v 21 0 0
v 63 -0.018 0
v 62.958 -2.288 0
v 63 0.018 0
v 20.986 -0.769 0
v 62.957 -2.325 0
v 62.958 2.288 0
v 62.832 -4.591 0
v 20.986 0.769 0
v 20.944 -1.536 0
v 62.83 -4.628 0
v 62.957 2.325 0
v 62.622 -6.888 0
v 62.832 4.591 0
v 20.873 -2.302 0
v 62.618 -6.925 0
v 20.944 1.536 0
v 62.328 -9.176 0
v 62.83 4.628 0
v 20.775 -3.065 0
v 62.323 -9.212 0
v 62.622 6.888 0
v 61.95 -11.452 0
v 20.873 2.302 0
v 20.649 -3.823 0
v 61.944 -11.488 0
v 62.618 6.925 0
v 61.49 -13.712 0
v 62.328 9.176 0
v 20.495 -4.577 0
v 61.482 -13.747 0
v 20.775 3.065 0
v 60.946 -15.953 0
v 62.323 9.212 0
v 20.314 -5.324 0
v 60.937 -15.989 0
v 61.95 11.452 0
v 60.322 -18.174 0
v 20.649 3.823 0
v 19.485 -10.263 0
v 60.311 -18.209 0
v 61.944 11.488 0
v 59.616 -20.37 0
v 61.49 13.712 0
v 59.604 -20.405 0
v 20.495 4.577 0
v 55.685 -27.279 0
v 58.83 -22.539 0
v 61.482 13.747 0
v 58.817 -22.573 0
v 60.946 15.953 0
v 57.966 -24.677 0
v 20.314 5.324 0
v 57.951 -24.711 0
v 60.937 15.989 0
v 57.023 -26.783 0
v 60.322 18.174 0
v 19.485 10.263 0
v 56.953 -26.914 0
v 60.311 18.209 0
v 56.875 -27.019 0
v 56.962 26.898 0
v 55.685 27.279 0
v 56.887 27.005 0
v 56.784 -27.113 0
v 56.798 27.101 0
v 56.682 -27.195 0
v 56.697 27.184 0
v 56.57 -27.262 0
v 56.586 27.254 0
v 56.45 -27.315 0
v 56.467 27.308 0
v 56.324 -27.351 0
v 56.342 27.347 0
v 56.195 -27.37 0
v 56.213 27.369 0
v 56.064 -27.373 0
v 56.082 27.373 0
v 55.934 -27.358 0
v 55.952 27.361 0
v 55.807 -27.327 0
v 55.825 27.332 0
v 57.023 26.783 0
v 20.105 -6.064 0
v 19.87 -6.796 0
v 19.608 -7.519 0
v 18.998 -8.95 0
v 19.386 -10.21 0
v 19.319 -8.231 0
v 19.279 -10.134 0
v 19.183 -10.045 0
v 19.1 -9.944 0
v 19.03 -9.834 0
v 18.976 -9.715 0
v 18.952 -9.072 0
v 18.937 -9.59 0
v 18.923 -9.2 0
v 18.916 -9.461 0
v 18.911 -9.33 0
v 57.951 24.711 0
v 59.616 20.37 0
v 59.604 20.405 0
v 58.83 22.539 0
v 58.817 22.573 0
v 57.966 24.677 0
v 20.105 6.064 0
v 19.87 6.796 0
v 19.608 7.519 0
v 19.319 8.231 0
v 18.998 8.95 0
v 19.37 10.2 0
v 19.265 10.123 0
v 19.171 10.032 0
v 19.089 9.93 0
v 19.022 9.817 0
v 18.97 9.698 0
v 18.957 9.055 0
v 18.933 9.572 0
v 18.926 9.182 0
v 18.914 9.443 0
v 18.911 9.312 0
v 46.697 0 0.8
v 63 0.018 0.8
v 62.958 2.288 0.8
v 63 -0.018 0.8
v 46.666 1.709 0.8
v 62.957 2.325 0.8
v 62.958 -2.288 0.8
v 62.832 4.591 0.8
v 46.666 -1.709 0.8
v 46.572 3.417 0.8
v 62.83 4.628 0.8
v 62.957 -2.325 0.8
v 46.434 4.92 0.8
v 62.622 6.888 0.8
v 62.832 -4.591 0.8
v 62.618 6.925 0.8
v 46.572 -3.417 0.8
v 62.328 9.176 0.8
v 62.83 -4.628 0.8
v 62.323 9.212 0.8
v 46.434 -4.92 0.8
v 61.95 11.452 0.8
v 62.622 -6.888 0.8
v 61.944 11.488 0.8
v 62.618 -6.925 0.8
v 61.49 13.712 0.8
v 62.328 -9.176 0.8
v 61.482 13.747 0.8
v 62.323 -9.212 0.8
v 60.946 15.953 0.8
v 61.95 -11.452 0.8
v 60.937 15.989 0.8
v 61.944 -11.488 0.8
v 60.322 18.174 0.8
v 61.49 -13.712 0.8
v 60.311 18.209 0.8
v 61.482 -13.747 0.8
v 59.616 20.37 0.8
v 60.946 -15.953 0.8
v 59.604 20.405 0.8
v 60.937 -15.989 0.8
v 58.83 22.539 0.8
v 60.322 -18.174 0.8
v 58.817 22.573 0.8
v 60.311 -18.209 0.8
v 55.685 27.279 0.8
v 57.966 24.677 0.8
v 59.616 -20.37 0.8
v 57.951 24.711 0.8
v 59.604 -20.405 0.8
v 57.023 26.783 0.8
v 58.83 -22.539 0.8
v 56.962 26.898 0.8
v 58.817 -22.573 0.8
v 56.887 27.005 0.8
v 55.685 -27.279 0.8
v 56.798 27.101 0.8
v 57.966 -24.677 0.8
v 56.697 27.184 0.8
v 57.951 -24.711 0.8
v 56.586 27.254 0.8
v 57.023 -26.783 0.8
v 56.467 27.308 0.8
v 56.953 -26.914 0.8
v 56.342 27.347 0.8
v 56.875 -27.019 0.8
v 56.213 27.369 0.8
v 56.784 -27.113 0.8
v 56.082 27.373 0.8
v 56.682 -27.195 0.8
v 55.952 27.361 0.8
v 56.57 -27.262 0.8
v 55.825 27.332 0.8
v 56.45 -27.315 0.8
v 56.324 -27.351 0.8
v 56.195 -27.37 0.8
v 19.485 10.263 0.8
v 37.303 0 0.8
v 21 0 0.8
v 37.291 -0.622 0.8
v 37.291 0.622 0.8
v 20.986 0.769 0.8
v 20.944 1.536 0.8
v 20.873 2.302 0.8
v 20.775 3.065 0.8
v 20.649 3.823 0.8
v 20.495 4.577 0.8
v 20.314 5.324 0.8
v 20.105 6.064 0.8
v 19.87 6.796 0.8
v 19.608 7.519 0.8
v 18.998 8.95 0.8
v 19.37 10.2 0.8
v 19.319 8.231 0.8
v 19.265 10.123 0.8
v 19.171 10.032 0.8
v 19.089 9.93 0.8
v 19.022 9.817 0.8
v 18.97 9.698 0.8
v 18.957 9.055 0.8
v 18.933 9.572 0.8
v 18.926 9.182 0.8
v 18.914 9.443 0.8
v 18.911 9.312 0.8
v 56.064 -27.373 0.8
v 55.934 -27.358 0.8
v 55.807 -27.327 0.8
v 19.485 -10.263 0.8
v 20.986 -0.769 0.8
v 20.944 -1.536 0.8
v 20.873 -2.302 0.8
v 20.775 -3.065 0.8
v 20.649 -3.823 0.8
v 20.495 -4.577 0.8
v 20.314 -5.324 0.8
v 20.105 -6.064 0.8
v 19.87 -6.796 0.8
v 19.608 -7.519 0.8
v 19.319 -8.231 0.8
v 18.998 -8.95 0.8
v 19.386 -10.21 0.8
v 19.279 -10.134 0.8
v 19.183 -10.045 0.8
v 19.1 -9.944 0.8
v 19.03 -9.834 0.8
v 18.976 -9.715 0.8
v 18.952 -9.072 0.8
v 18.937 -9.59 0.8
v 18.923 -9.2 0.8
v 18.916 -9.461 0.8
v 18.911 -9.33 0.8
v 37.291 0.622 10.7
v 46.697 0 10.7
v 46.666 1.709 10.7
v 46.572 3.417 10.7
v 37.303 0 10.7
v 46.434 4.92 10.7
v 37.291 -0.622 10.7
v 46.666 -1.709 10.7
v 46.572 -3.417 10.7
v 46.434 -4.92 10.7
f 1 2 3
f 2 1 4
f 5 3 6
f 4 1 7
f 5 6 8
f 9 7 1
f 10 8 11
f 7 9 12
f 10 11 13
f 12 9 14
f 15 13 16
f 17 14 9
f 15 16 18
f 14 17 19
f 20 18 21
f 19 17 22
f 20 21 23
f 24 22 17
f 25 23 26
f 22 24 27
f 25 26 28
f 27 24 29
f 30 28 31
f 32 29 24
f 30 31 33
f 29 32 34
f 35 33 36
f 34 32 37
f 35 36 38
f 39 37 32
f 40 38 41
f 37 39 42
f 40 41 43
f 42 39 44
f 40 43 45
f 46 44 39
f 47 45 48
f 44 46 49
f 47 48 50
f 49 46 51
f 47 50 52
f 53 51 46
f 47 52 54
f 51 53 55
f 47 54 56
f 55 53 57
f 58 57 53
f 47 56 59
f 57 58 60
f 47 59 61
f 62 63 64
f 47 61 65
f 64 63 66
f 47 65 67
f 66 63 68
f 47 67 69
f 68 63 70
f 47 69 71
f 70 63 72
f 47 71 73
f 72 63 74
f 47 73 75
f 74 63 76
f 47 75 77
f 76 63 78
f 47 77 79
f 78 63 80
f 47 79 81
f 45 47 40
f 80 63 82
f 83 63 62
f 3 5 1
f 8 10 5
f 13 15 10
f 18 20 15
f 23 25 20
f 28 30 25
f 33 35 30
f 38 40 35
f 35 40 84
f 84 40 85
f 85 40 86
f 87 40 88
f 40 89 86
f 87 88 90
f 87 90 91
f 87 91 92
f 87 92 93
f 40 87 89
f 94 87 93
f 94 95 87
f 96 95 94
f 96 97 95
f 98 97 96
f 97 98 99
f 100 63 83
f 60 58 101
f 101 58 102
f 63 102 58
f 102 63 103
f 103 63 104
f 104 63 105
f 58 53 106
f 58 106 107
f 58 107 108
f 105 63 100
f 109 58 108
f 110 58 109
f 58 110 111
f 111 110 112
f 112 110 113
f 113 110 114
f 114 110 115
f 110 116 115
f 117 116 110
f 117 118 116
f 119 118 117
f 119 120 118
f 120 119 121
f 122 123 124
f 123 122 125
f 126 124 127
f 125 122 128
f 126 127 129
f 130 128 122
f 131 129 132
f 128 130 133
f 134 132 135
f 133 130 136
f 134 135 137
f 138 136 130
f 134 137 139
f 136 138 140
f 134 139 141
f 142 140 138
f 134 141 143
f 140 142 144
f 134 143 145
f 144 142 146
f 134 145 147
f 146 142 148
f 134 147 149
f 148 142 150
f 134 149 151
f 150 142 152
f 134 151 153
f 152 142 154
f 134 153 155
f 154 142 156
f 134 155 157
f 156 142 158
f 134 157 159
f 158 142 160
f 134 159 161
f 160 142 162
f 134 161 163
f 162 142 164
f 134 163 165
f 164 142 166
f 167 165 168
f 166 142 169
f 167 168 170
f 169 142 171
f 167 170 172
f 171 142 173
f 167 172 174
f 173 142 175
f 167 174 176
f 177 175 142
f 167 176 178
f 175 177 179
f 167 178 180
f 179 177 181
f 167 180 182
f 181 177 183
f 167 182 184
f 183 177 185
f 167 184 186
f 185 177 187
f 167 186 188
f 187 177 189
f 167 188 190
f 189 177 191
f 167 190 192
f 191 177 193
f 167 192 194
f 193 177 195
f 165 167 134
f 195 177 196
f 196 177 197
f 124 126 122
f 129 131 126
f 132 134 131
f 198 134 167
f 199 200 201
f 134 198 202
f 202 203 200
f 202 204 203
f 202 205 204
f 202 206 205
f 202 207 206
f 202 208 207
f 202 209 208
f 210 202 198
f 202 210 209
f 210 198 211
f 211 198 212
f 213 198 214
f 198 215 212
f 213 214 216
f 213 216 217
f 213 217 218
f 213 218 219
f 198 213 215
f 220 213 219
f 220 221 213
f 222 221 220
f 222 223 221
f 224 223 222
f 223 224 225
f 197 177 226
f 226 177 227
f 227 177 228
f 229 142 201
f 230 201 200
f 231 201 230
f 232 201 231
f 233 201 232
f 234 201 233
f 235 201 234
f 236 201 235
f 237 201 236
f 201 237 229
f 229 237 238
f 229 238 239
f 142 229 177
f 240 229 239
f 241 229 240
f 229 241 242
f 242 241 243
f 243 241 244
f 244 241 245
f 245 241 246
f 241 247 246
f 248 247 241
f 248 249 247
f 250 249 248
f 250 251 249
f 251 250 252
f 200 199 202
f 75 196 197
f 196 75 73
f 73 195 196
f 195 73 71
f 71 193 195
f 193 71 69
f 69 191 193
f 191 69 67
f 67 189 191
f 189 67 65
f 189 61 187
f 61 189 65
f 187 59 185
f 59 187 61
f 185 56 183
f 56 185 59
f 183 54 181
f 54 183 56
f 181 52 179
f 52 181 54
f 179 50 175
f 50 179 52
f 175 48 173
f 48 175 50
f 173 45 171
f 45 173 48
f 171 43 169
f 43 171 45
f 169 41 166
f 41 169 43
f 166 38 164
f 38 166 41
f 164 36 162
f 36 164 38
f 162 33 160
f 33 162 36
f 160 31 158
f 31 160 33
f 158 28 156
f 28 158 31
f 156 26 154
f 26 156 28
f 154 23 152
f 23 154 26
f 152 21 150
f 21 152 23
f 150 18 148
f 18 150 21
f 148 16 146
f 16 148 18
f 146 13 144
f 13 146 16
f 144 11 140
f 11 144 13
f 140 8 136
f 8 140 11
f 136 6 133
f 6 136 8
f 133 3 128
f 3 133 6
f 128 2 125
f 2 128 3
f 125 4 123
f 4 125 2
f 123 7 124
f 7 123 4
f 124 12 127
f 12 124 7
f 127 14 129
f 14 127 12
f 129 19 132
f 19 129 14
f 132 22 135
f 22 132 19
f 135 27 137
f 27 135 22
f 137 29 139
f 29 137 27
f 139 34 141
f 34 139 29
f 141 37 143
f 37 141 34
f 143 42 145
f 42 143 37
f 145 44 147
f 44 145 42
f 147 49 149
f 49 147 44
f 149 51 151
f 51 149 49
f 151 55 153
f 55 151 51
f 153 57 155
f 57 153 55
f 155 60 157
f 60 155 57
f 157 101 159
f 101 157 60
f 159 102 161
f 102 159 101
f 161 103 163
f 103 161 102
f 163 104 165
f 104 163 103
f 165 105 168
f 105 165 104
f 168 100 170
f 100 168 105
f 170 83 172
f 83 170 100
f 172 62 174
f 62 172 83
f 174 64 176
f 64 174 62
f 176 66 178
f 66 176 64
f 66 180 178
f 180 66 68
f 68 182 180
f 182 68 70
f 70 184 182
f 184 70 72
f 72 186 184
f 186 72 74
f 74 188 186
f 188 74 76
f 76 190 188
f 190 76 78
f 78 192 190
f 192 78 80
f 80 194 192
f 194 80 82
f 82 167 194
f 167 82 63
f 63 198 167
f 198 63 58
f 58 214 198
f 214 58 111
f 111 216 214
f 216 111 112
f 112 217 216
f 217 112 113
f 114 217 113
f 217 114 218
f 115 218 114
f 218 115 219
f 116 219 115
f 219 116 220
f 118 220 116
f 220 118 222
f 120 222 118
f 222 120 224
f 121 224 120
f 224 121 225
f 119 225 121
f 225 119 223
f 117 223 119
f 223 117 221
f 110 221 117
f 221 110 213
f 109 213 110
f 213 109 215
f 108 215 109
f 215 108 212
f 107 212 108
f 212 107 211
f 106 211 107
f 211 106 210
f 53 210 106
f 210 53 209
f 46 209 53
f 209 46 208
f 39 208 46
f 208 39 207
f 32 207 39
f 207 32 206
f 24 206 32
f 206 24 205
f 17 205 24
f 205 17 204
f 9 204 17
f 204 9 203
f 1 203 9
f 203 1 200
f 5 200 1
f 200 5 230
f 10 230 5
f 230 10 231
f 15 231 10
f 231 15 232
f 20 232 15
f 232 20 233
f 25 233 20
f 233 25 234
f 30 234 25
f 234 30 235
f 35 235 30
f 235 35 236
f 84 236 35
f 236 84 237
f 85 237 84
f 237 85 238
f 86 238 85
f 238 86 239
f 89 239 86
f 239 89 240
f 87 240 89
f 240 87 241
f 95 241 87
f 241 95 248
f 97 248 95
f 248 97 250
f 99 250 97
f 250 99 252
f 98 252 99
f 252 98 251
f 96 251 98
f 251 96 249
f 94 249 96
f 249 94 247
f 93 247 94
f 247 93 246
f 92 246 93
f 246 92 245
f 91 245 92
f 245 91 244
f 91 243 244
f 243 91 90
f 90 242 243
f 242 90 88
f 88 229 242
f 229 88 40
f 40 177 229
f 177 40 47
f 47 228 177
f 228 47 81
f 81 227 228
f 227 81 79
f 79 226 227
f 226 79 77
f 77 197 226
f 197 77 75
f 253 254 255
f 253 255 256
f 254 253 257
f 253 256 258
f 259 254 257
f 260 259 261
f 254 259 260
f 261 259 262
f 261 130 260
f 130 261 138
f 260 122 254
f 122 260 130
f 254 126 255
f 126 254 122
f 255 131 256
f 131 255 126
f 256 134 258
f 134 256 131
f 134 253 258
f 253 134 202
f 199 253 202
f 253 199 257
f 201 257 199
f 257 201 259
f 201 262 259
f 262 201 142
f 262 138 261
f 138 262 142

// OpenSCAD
// file: parameters.scad
// =============================================================================
// Gen-BH — nightly 2026-10-04 (physics_scorer, honest magpylib watts)
// All 16 O20 magnets used as 8 double-height (10 mm) poles: 4-pole / 6-coil dual rotor on 3 mm steel, tall 9.9 mm copper; O5 assists left out because the scorer shows they do not help this pole layout.
// Clocking 0 deg (magnets N facing S) + D-flat keyed bore + index notch + flip-symmetric hole map.
// Windable 2-piece bobbin; turns = physics_scorer turns_fit; copper only between flanges.
// Steel back-iron: two 3.0 mm mild-steel discs (steel_backiron_disc.dxf); magnets sit ON the steel
// (through-pockets) -> score with --back-iron.
// =============================================================================
topology            = "dual_rotor";

// --- Wire / winding (physics_scorer winding-fit) -------------------------------
wire_awg            = 26;
wire_od             = 0.45;     // insulated OD mm (bare 0.405)
fill_realistic      = 0.60;     // insulated-wire area / window, hand-wound layered
turns               = 571;       // = physics_scorer turns_fit (do NOT raise)
coil_former_type    = "bobbin";
coil_core_inset     = 15.30;     // radial copper build: hub = copper boundary inset by this
wind_build_axial    = 0.0;      // nothing proud of the flanges
wind_build_radial   = 0.0;

// --- Bobbin (base + lid) ---------------------------------------------------------
coil_id_r           = 22.00;    // copper boundary sector
coil_od_r           = 62.00;
span_deg            = 50.35;    // = pitch - 2*asin((wall+0.85)/coil_id_r) -> >=1.2 mm stator web
former_web          = 9.90;     // copper height between flanges (TALL copper: steel keeps Bz up)
flange_t            = 0.80;     // >= 0.8 mm FDM wall rule (tall winds push on the flanges)
wall                = 1.00;     // flange lip beyond copper
former_bare_h       = former_web + 2 * flange_t;
coil_envelope_h     = former_bare_h + 2 * wind_build_axial;
tab_w               = 7.0;
tab_len             = 7.0;
tab_h               = former_bare_h / 2;
pin_d               = 1.9;      // 1.75 mm filament locating pin
coil_mount_r        = coil_od_r + 0.2 + 4.0;
lead_y              = 1.6;
lead_slot_w         = 0.9;
lead_groove_d       = 0.6;

// --- Gap -------------------------------------------------------------------------
run_clear           = 0.50;     // rotor face -> flange
gap_spacer_h        = run_clear + wind_build_axial;
m2m                 = coil_envelope_h + 2 * run_clear;   // rotor face to rotor face (= gap_sleeve length)

// --- Stator ----------------------------------------------------------------------
coil_stations       = 6;
bay_clear           = 0.25;
stator_thick        = former_bare_h;                        // bobbins flush both faces
stator_od           = 148.0;
shaft_clear_stator  = 14.0;     // stator is static; gap sleeve OD 12 spins inside

// --- Rotor(s) --------------------------------------------------------------------
magnet_Br           = 1.43;     // N52
magnet_d_large      = 20.0;
magnet_h_large      = 10.0;      // two O20x5 stacked per pocket
magnet_h_small      = 10.0;      // two O5x5 stacked per pocket
halbach_magnetisation = "none";  // NO O5 assist magnets in this kit (scorer: they do not help 4-pole)
rotor_b_same_axis   = true;     // same-index magnets share one axis: N faces S across the gap
large_pocket_d      = 20.3;
small_pocket_d      = 5.3;
pocket_h            = 10.10;     // THROUGH the carrier: magnet back face sits on the steel disc
large_n             = 4;
R_large             = 44.0;
small_r_list        = [];       // no O5 pockets
carrier_od          = 126.0;
carrier_thick       = pocket_h;
hub_h               = 10.0;
hub_od              = 24.0;     // slim hub so the M4 brace rods fit at R~18 inside the coil ring
hub_insert_d        = 4.0;      // M3 heat-set insert, radial, bears on the D-flat
rotor_b_offset_deg  = 0.0;      // CLOCKING: magnets directly opposite
shaft_key           = "dflat";
dflat_depth         = 0.5;      // 8 mm shaft with 0.5 mm flat (7.5 across flat)
index_notch_d       = 3.0;

// --- Steel back-iron (buyable laser-cut) -------------------------------------------
steel_t             = 3.0;      // mild steel thickness (not modelled by the image method; >=3 avoids saturation)
steel_center_hole   = 26.0;     // slips over the rotor hub (OD 24)

// --- Modular MAX interface ----------------------------------------------------------
shaft_bore          = 8.35;
dflat_x             = 4.0 - dflat_depth + (shaft_bore - 8.0) / 2;
bearing_d           = 21.85;
bearing_h           = 7.2;
m3_clear            = 3.5;
bolt_r_inner        = 27.0;     // M3 steel-disc clamp bolts (inside the magnet ring)
bolt_n_inner        = 4;
bolt_inner_angles   = [45, 135, 225, 315];
bolt_r_outer        = 58.0;     // M3 steel-disc clamp bolts (outside the magnet ring)
bolt_outer_angles   = [45, 135, 225, 315];
flange_bolt_r       = 69.0;     // frame rods: OUTSIDE the rotor OD (rotors spin inside them)
flange_bolt_n       = 6;
flange_bolt_offset  = 30.00;    // between coil stations -> never cuts a lead groove/tab
brace_r             = 17.5;
brace_d             = 4.3;      // temporary M4 jack rods (assembly only)
brace_n             = 4;
brace_angles        = [0, 90, 180, 270];          // flip-symmetric

spacer_pad_od       = 14.0;
spacer_pad_id       = m3_clear;
endbell_od          = 148.0;
endbell_thick       = 8.0;
endbell_shaft_clear = 10.0;
collar_h            = 10.0;
standoff_od         = 9.0;
frame_standoff_h    = run_clear + carrier_thick + hub_h + collar_h + 2.0;
sleeve_od           = 12.0;
plate_max_mm        = 410;

$fn = 64;
// main file
// Gen-BH — bobbin BASE (bottom flange + hub). Print x6, flange down. Wind 26 AWG x 571 t around
// the hub with the LID glued on (coil_lid.stl). Copper lives ONLY between the flanges (no proud winds).
include <parameters.scad>;
$fn = 48;
module sector_2d(r_in, r_out, ang) {
    polygon([
        for (a = [-ang/2 : ang/24 : ang/2]) [r_in*cos(a), r_in*sin(a)],
        for (a = [ang/2 : -ang/24 : -ang/2]) [r_out*cos(a), r_out*sin(a)]
    ]);
}
module footprint_2d() { offset(r=wall) sector_2d(coil_id_r, coil_od_r, span_deg); }
module hub_2d()       { offset(delta=-coil_core_inset) sector_2d(coil_id_r, coil_od_r, span_deg); }

union() {
    linear_extrude(flange_t) footprint_2d();
    translate([0, 0, flange_t - 0.01]) linear_extrude(former_web + 0.01) hub_2d();
}
